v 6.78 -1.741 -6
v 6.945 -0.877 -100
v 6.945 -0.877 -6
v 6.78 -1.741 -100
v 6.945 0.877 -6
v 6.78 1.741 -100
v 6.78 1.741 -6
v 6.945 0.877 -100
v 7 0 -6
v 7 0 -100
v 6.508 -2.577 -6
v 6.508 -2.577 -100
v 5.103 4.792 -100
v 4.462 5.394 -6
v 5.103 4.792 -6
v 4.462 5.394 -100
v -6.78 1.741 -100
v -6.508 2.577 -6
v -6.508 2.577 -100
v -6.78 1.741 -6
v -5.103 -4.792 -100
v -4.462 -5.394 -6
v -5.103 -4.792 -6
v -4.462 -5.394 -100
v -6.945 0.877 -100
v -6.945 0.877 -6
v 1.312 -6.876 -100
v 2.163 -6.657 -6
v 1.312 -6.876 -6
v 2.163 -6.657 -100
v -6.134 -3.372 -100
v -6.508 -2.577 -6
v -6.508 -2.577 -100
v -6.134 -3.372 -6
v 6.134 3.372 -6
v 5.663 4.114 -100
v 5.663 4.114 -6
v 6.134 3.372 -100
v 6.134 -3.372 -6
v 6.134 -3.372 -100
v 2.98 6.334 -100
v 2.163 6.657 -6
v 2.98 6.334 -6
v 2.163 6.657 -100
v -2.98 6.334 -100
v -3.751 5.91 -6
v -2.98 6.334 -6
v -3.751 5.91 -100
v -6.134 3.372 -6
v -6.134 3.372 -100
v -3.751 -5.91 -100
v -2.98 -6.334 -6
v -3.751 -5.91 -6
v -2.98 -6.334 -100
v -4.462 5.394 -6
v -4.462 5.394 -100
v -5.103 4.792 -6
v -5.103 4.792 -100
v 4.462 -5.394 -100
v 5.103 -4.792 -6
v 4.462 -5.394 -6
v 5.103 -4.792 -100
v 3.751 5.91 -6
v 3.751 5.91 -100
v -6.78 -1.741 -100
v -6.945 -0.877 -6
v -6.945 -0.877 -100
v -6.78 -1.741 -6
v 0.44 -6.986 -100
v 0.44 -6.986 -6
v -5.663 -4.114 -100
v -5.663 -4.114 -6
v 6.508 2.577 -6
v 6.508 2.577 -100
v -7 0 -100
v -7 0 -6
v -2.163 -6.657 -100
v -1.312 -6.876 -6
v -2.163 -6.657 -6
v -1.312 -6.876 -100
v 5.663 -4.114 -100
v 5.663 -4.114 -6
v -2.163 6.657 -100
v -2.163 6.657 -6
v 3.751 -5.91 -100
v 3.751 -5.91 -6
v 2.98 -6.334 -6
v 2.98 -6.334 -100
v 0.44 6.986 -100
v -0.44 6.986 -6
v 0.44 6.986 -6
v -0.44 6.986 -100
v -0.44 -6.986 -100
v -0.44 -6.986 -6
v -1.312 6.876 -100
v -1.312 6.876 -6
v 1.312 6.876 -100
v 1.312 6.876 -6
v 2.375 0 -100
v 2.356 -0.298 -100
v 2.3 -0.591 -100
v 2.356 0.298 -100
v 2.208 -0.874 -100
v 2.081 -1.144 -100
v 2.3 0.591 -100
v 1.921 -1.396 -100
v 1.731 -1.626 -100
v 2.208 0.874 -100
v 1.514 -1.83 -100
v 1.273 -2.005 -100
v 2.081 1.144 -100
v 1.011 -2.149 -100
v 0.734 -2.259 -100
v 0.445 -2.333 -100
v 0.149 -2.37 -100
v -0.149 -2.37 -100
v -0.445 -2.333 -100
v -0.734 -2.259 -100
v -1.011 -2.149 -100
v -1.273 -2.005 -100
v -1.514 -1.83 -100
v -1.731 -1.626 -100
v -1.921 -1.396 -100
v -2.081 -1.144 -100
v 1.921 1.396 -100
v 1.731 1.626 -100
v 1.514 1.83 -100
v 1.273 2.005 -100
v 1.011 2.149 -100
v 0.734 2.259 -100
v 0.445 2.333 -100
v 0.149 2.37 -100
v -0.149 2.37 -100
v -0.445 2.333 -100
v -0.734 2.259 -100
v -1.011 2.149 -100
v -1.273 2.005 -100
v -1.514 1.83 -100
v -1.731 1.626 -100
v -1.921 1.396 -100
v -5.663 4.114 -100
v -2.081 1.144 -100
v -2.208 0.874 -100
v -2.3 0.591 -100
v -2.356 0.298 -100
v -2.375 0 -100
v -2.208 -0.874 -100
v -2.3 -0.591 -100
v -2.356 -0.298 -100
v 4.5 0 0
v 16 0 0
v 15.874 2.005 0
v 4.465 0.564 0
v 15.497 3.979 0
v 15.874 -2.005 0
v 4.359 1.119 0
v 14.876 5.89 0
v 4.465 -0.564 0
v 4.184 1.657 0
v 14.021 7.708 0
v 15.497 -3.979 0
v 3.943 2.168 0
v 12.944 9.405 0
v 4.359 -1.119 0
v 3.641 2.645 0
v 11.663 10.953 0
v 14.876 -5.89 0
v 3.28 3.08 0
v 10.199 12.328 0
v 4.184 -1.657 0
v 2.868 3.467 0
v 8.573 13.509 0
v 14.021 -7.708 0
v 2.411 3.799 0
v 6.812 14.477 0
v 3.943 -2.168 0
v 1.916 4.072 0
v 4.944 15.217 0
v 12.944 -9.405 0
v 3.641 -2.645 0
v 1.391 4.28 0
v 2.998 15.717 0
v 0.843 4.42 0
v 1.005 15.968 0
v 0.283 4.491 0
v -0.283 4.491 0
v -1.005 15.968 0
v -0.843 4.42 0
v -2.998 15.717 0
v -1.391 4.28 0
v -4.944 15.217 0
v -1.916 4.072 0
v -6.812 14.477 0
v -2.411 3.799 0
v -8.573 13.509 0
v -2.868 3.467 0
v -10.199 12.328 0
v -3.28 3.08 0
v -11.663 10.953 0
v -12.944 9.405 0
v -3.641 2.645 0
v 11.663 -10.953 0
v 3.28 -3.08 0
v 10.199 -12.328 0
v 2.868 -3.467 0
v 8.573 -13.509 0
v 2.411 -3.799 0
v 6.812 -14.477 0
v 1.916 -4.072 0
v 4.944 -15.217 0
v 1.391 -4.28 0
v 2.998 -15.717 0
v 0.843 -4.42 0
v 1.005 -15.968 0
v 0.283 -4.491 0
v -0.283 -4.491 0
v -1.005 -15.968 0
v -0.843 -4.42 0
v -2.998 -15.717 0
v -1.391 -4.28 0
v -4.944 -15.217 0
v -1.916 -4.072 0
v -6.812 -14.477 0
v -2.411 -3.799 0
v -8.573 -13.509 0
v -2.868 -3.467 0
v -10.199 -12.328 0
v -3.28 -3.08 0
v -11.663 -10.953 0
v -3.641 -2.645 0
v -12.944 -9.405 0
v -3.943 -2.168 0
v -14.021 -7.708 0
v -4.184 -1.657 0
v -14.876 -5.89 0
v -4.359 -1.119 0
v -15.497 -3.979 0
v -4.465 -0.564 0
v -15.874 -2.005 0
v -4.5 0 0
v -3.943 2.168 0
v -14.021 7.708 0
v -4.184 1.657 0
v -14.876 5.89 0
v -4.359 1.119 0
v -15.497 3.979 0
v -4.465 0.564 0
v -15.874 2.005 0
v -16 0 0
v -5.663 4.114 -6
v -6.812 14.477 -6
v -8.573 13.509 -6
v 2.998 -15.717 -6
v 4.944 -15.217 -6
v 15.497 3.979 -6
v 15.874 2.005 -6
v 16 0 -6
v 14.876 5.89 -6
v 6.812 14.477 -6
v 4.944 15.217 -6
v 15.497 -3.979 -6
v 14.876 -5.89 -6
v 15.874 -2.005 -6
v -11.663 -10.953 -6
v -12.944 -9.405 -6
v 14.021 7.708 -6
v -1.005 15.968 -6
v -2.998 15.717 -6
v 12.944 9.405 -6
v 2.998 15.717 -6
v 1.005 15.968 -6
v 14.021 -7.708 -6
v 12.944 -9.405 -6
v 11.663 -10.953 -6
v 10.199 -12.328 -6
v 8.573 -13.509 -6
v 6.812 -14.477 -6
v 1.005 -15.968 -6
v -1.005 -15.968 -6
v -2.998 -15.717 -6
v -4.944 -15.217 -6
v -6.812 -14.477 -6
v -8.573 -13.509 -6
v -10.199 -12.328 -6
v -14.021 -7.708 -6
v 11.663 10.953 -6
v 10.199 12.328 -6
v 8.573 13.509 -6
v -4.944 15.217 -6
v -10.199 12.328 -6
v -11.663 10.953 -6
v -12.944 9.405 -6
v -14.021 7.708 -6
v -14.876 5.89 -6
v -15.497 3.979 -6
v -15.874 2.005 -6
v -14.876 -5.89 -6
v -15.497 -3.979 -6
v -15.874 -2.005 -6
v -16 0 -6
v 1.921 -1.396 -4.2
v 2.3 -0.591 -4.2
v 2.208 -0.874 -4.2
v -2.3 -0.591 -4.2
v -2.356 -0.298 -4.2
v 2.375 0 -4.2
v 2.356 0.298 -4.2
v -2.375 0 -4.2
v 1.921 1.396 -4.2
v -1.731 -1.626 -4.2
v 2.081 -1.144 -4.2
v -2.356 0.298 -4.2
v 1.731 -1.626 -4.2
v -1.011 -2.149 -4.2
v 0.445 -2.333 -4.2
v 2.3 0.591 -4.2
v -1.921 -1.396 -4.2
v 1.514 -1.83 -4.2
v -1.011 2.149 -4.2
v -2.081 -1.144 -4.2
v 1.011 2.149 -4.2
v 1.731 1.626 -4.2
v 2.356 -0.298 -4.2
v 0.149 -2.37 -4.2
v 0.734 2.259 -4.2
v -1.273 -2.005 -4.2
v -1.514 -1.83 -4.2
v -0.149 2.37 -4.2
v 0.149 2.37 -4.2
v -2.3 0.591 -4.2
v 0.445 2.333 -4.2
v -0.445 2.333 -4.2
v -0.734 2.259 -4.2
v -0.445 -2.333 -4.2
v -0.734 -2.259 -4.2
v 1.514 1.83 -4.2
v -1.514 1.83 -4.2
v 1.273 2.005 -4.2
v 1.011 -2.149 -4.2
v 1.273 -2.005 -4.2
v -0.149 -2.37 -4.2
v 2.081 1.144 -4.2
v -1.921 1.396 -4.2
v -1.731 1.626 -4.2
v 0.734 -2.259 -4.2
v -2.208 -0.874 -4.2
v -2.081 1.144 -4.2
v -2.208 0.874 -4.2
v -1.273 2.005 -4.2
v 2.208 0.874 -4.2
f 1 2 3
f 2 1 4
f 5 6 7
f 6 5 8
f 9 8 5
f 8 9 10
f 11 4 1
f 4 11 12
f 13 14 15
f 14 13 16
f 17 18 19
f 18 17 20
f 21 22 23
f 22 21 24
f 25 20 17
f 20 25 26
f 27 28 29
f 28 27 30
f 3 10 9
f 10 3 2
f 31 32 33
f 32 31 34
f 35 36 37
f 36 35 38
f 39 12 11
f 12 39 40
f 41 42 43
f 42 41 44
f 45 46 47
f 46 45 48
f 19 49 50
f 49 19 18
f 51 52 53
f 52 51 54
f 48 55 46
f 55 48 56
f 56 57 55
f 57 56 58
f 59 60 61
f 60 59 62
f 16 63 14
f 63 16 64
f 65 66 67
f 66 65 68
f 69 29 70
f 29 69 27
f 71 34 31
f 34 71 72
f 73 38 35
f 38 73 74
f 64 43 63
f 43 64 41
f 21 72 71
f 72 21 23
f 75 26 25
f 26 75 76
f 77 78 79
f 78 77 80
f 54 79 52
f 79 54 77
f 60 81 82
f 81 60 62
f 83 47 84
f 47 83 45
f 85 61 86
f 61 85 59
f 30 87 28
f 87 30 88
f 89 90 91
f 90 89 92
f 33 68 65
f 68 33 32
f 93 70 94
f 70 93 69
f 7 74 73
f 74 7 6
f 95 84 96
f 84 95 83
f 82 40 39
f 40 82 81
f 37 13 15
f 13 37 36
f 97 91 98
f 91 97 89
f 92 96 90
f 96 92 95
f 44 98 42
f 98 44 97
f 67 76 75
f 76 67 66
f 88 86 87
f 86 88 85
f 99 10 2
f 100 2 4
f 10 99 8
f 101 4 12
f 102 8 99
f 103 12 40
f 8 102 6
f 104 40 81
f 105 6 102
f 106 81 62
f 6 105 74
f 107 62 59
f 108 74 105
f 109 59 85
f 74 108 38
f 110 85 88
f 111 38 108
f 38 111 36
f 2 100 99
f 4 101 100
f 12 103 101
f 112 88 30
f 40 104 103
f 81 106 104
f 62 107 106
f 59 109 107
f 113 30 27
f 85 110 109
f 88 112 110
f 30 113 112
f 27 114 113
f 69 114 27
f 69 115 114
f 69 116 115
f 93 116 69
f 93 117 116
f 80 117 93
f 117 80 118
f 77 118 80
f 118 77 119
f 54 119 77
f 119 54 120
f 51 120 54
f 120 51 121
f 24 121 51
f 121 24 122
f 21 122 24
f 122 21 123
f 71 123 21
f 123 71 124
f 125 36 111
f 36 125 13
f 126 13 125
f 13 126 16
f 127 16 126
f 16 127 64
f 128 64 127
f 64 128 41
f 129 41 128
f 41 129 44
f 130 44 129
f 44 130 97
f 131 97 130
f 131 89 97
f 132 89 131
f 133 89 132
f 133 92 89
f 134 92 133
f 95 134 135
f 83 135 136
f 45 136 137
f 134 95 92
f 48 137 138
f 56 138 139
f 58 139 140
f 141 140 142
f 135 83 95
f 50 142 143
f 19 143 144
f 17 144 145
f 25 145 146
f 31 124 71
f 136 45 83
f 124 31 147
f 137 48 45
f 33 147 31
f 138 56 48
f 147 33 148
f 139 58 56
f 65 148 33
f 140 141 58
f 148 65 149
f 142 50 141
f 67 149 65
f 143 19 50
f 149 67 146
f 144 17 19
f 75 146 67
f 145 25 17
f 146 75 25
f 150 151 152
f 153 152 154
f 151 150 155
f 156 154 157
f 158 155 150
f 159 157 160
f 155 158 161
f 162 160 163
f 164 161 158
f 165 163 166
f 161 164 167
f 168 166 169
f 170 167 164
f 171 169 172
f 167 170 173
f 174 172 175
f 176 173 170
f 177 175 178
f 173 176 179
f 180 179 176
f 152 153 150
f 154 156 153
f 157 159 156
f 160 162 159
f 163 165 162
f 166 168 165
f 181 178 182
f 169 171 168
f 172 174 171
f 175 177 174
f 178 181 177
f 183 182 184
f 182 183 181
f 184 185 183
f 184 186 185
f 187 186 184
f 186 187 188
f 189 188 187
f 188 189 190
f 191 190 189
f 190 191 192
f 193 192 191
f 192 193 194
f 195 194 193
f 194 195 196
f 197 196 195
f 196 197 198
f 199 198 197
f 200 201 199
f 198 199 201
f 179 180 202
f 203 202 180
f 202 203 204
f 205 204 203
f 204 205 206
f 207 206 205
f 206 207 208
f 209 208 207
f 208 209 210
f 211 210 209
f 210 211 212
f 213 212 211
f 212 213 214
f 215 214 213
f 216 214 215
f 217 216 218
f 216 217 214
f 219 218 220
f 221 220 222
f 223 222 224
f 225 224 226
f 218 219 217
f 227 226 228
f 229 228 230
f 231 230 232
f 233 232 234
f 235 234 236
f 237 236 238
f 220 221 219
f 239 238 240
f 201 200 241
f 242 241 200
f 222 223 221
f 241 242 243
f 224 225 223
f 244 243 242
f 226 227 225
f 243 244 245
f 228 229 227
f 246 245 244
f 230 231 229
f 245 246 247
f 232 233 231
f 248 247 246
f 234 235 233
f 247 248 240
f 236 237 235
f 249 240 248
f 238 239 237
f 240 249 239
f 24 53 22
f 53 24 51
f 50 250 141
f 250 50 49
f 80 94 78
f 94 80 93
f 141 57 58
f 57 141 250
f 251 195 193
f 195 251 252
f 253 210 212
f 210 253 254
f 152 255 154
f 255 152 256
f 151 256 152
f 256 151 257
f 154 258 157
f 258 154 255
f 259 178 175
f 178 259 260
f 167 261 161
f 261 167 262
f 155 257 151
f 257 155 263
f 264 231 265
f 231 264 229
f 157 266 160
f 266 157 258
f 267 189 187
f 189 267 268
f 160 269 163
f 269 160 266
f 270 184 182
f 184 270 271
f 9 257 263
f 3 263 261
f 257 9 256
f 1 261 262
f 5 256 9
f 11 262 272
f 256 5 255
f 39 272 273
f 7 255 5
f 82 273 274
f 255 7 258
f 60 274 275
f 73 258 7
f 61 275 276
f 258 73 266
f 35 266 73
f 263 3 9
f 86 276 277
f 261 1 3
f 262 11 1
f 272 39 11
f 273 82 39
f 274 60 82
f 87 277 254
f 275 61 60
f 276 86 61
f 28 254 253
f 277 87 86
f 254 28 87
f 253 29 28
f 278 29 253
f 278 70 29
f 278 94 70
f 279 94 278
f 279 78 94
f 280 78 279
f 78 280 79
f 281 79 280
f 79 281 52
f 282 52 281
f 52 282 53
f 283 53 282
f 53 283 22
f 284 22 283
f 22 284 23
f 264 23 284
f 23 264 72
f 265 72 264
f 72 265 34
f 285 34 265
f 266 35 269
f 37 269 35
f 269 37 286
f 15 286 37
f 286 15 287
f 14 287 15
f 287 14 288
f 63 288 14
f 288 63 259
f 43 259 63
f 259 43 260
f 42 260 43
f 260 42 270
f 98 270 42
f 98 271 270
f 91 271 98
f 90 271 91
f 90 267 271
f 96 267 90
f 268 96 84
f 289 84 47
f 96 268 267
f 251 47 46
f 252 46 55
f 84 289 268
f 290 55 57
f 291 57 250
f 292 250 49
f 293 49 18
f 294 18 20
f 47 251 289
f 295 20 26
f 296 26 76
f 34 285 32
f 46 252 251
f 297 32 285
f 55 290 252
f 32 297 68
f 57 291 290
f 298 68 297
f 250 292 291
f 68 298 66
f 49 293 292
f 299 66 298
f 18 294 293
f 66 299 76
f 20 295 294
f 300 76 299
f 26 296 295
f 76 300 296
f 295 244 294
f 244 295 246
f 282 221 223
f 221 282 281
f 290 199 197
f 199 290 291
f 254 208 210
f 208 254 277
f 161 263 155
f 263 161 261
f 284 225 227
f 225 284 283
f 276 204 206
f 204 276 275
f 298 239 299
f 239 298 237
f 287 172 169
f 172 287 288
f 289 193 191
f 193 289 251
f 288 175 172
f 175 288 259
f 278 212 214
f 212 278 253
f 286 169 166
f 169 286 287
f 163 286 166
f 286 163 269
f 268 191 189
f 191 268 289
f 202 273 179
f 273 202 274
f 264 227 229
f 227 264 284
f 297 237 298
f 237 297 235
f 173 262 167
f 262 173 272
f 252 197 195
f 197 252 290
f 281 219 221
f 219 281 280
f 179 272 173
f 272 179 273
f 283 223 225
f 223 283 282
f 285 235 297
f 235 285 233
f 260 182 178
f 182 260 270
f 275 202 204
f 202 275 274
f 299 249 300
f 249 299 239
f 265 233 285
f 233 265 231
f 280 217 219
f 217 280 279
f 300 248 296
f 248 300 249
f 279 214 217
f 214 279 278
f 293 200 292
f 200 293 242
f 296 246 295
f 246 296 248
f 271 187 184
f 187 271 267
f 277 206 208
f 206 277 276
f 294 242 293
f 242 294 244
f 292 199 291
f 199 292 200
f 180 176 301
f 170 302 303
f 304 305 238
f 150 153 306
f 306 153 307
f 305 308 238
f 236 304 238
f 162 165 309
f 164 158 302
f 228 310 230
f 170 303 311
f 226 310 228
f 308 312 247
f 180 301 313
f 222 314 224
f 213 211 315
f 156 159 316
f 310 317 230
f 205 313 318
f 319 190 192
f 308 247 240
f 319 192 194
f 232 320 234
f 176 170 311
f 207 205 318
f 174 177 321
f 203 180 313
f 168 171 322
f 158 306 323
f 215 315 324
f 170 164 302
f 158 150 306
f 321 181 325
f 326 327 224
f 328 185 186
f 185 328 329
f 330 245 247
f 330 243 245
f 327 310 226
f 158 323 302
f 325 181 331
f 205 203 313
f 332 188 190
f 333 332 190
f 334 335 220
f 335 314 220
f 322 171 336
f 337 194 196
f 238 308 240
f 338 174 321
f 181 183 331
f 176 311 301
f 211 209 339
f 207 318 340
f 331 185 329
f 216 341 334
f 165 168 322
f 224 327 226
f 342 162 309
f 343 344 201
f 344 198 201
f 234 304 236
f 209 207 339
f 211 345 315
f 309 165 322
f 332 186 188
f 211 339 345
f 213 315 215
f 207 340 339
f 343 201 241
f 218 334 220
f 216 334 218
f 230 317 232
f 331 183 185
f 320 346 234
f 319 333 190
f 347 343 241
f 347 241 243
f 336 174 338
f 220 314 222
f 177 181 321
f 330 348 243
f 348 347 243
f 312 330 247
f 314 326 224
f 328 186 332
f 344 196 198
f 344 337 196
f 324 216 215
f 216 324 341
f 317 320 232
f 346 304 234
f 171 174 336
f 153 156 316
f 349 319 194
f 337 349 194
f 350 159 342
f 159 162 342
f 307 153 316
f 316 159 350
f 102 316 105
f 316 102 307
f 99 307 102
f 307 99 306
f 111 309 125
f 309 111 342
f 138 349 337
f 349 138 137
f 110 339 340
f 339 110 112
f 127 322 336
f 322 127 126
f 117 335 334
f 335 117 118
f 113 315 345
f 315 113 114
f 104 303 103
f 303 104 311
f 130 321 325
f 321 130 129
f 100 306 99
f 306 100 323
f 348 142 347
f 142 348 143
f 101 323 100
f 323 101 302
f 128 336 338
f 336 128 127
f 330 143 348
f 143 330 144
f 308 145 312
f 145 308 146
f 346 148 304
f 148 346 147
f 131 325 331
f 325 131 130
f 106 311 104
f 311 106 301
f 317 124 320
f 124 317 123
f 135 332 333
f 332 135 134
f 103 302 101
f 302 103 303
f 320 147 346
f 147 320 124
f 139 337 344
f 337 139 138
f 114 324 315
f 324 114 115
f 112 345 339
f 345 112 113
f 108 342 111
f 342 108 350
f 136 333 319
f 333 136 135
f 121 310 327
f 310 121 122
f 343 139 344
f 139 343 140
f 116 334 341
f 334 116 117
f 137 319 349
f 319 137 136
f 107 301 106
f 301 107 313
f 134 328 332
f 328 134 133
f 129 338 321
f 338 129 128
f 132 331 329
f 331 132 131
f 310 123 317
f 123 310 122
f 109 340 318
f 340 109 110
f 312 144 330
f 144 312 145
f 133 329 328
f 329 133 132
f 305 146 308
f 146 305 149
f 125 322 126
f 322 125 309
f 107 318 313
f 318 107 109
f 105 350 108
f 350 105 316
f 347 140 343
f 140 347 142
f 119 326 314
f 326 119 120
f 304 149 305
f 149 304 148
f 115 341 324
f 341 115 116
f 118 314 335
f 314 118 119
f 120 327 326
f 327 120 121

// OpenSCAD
$fn = 50;


difference() {
	union() {
		translate(v = [0, 0, -100.0000000000]) {
			cylinder(h = 100, r = 7.0000000000);
		}
		translate(v = [0, 0, -6.0000000000]) {
			cylinder(h = 6, r = 16.0000000000);
		}
	}
	union() {
		translate(v = [0, 0, 0]) {
			rotate(a = [0, 0, 0]) {
				difference() {
					union() {
						#translate(v = [0, 0, -100.0000000000]) {
							cylinder(h = 100, r = 2.2500000000);
						}
						#translate(v = [0, 0, -4.2000000000]) {
							cylinder(h = 4.2000000000, r = 7.0000000000, r1 = 2.3750000000, r2 = 4.5000000000);
						}
						#translate(v = [0, 0, -100.0000000000]) {
							cylinder(h = 100, r = 2.3750000000);
						}
						#translate(v = [0, 0, -100.0000000000]) {
							cylinder(h = 100, r = 2.2500000000);
						}
					}
					union();
				}
			}
		}
	}
}
